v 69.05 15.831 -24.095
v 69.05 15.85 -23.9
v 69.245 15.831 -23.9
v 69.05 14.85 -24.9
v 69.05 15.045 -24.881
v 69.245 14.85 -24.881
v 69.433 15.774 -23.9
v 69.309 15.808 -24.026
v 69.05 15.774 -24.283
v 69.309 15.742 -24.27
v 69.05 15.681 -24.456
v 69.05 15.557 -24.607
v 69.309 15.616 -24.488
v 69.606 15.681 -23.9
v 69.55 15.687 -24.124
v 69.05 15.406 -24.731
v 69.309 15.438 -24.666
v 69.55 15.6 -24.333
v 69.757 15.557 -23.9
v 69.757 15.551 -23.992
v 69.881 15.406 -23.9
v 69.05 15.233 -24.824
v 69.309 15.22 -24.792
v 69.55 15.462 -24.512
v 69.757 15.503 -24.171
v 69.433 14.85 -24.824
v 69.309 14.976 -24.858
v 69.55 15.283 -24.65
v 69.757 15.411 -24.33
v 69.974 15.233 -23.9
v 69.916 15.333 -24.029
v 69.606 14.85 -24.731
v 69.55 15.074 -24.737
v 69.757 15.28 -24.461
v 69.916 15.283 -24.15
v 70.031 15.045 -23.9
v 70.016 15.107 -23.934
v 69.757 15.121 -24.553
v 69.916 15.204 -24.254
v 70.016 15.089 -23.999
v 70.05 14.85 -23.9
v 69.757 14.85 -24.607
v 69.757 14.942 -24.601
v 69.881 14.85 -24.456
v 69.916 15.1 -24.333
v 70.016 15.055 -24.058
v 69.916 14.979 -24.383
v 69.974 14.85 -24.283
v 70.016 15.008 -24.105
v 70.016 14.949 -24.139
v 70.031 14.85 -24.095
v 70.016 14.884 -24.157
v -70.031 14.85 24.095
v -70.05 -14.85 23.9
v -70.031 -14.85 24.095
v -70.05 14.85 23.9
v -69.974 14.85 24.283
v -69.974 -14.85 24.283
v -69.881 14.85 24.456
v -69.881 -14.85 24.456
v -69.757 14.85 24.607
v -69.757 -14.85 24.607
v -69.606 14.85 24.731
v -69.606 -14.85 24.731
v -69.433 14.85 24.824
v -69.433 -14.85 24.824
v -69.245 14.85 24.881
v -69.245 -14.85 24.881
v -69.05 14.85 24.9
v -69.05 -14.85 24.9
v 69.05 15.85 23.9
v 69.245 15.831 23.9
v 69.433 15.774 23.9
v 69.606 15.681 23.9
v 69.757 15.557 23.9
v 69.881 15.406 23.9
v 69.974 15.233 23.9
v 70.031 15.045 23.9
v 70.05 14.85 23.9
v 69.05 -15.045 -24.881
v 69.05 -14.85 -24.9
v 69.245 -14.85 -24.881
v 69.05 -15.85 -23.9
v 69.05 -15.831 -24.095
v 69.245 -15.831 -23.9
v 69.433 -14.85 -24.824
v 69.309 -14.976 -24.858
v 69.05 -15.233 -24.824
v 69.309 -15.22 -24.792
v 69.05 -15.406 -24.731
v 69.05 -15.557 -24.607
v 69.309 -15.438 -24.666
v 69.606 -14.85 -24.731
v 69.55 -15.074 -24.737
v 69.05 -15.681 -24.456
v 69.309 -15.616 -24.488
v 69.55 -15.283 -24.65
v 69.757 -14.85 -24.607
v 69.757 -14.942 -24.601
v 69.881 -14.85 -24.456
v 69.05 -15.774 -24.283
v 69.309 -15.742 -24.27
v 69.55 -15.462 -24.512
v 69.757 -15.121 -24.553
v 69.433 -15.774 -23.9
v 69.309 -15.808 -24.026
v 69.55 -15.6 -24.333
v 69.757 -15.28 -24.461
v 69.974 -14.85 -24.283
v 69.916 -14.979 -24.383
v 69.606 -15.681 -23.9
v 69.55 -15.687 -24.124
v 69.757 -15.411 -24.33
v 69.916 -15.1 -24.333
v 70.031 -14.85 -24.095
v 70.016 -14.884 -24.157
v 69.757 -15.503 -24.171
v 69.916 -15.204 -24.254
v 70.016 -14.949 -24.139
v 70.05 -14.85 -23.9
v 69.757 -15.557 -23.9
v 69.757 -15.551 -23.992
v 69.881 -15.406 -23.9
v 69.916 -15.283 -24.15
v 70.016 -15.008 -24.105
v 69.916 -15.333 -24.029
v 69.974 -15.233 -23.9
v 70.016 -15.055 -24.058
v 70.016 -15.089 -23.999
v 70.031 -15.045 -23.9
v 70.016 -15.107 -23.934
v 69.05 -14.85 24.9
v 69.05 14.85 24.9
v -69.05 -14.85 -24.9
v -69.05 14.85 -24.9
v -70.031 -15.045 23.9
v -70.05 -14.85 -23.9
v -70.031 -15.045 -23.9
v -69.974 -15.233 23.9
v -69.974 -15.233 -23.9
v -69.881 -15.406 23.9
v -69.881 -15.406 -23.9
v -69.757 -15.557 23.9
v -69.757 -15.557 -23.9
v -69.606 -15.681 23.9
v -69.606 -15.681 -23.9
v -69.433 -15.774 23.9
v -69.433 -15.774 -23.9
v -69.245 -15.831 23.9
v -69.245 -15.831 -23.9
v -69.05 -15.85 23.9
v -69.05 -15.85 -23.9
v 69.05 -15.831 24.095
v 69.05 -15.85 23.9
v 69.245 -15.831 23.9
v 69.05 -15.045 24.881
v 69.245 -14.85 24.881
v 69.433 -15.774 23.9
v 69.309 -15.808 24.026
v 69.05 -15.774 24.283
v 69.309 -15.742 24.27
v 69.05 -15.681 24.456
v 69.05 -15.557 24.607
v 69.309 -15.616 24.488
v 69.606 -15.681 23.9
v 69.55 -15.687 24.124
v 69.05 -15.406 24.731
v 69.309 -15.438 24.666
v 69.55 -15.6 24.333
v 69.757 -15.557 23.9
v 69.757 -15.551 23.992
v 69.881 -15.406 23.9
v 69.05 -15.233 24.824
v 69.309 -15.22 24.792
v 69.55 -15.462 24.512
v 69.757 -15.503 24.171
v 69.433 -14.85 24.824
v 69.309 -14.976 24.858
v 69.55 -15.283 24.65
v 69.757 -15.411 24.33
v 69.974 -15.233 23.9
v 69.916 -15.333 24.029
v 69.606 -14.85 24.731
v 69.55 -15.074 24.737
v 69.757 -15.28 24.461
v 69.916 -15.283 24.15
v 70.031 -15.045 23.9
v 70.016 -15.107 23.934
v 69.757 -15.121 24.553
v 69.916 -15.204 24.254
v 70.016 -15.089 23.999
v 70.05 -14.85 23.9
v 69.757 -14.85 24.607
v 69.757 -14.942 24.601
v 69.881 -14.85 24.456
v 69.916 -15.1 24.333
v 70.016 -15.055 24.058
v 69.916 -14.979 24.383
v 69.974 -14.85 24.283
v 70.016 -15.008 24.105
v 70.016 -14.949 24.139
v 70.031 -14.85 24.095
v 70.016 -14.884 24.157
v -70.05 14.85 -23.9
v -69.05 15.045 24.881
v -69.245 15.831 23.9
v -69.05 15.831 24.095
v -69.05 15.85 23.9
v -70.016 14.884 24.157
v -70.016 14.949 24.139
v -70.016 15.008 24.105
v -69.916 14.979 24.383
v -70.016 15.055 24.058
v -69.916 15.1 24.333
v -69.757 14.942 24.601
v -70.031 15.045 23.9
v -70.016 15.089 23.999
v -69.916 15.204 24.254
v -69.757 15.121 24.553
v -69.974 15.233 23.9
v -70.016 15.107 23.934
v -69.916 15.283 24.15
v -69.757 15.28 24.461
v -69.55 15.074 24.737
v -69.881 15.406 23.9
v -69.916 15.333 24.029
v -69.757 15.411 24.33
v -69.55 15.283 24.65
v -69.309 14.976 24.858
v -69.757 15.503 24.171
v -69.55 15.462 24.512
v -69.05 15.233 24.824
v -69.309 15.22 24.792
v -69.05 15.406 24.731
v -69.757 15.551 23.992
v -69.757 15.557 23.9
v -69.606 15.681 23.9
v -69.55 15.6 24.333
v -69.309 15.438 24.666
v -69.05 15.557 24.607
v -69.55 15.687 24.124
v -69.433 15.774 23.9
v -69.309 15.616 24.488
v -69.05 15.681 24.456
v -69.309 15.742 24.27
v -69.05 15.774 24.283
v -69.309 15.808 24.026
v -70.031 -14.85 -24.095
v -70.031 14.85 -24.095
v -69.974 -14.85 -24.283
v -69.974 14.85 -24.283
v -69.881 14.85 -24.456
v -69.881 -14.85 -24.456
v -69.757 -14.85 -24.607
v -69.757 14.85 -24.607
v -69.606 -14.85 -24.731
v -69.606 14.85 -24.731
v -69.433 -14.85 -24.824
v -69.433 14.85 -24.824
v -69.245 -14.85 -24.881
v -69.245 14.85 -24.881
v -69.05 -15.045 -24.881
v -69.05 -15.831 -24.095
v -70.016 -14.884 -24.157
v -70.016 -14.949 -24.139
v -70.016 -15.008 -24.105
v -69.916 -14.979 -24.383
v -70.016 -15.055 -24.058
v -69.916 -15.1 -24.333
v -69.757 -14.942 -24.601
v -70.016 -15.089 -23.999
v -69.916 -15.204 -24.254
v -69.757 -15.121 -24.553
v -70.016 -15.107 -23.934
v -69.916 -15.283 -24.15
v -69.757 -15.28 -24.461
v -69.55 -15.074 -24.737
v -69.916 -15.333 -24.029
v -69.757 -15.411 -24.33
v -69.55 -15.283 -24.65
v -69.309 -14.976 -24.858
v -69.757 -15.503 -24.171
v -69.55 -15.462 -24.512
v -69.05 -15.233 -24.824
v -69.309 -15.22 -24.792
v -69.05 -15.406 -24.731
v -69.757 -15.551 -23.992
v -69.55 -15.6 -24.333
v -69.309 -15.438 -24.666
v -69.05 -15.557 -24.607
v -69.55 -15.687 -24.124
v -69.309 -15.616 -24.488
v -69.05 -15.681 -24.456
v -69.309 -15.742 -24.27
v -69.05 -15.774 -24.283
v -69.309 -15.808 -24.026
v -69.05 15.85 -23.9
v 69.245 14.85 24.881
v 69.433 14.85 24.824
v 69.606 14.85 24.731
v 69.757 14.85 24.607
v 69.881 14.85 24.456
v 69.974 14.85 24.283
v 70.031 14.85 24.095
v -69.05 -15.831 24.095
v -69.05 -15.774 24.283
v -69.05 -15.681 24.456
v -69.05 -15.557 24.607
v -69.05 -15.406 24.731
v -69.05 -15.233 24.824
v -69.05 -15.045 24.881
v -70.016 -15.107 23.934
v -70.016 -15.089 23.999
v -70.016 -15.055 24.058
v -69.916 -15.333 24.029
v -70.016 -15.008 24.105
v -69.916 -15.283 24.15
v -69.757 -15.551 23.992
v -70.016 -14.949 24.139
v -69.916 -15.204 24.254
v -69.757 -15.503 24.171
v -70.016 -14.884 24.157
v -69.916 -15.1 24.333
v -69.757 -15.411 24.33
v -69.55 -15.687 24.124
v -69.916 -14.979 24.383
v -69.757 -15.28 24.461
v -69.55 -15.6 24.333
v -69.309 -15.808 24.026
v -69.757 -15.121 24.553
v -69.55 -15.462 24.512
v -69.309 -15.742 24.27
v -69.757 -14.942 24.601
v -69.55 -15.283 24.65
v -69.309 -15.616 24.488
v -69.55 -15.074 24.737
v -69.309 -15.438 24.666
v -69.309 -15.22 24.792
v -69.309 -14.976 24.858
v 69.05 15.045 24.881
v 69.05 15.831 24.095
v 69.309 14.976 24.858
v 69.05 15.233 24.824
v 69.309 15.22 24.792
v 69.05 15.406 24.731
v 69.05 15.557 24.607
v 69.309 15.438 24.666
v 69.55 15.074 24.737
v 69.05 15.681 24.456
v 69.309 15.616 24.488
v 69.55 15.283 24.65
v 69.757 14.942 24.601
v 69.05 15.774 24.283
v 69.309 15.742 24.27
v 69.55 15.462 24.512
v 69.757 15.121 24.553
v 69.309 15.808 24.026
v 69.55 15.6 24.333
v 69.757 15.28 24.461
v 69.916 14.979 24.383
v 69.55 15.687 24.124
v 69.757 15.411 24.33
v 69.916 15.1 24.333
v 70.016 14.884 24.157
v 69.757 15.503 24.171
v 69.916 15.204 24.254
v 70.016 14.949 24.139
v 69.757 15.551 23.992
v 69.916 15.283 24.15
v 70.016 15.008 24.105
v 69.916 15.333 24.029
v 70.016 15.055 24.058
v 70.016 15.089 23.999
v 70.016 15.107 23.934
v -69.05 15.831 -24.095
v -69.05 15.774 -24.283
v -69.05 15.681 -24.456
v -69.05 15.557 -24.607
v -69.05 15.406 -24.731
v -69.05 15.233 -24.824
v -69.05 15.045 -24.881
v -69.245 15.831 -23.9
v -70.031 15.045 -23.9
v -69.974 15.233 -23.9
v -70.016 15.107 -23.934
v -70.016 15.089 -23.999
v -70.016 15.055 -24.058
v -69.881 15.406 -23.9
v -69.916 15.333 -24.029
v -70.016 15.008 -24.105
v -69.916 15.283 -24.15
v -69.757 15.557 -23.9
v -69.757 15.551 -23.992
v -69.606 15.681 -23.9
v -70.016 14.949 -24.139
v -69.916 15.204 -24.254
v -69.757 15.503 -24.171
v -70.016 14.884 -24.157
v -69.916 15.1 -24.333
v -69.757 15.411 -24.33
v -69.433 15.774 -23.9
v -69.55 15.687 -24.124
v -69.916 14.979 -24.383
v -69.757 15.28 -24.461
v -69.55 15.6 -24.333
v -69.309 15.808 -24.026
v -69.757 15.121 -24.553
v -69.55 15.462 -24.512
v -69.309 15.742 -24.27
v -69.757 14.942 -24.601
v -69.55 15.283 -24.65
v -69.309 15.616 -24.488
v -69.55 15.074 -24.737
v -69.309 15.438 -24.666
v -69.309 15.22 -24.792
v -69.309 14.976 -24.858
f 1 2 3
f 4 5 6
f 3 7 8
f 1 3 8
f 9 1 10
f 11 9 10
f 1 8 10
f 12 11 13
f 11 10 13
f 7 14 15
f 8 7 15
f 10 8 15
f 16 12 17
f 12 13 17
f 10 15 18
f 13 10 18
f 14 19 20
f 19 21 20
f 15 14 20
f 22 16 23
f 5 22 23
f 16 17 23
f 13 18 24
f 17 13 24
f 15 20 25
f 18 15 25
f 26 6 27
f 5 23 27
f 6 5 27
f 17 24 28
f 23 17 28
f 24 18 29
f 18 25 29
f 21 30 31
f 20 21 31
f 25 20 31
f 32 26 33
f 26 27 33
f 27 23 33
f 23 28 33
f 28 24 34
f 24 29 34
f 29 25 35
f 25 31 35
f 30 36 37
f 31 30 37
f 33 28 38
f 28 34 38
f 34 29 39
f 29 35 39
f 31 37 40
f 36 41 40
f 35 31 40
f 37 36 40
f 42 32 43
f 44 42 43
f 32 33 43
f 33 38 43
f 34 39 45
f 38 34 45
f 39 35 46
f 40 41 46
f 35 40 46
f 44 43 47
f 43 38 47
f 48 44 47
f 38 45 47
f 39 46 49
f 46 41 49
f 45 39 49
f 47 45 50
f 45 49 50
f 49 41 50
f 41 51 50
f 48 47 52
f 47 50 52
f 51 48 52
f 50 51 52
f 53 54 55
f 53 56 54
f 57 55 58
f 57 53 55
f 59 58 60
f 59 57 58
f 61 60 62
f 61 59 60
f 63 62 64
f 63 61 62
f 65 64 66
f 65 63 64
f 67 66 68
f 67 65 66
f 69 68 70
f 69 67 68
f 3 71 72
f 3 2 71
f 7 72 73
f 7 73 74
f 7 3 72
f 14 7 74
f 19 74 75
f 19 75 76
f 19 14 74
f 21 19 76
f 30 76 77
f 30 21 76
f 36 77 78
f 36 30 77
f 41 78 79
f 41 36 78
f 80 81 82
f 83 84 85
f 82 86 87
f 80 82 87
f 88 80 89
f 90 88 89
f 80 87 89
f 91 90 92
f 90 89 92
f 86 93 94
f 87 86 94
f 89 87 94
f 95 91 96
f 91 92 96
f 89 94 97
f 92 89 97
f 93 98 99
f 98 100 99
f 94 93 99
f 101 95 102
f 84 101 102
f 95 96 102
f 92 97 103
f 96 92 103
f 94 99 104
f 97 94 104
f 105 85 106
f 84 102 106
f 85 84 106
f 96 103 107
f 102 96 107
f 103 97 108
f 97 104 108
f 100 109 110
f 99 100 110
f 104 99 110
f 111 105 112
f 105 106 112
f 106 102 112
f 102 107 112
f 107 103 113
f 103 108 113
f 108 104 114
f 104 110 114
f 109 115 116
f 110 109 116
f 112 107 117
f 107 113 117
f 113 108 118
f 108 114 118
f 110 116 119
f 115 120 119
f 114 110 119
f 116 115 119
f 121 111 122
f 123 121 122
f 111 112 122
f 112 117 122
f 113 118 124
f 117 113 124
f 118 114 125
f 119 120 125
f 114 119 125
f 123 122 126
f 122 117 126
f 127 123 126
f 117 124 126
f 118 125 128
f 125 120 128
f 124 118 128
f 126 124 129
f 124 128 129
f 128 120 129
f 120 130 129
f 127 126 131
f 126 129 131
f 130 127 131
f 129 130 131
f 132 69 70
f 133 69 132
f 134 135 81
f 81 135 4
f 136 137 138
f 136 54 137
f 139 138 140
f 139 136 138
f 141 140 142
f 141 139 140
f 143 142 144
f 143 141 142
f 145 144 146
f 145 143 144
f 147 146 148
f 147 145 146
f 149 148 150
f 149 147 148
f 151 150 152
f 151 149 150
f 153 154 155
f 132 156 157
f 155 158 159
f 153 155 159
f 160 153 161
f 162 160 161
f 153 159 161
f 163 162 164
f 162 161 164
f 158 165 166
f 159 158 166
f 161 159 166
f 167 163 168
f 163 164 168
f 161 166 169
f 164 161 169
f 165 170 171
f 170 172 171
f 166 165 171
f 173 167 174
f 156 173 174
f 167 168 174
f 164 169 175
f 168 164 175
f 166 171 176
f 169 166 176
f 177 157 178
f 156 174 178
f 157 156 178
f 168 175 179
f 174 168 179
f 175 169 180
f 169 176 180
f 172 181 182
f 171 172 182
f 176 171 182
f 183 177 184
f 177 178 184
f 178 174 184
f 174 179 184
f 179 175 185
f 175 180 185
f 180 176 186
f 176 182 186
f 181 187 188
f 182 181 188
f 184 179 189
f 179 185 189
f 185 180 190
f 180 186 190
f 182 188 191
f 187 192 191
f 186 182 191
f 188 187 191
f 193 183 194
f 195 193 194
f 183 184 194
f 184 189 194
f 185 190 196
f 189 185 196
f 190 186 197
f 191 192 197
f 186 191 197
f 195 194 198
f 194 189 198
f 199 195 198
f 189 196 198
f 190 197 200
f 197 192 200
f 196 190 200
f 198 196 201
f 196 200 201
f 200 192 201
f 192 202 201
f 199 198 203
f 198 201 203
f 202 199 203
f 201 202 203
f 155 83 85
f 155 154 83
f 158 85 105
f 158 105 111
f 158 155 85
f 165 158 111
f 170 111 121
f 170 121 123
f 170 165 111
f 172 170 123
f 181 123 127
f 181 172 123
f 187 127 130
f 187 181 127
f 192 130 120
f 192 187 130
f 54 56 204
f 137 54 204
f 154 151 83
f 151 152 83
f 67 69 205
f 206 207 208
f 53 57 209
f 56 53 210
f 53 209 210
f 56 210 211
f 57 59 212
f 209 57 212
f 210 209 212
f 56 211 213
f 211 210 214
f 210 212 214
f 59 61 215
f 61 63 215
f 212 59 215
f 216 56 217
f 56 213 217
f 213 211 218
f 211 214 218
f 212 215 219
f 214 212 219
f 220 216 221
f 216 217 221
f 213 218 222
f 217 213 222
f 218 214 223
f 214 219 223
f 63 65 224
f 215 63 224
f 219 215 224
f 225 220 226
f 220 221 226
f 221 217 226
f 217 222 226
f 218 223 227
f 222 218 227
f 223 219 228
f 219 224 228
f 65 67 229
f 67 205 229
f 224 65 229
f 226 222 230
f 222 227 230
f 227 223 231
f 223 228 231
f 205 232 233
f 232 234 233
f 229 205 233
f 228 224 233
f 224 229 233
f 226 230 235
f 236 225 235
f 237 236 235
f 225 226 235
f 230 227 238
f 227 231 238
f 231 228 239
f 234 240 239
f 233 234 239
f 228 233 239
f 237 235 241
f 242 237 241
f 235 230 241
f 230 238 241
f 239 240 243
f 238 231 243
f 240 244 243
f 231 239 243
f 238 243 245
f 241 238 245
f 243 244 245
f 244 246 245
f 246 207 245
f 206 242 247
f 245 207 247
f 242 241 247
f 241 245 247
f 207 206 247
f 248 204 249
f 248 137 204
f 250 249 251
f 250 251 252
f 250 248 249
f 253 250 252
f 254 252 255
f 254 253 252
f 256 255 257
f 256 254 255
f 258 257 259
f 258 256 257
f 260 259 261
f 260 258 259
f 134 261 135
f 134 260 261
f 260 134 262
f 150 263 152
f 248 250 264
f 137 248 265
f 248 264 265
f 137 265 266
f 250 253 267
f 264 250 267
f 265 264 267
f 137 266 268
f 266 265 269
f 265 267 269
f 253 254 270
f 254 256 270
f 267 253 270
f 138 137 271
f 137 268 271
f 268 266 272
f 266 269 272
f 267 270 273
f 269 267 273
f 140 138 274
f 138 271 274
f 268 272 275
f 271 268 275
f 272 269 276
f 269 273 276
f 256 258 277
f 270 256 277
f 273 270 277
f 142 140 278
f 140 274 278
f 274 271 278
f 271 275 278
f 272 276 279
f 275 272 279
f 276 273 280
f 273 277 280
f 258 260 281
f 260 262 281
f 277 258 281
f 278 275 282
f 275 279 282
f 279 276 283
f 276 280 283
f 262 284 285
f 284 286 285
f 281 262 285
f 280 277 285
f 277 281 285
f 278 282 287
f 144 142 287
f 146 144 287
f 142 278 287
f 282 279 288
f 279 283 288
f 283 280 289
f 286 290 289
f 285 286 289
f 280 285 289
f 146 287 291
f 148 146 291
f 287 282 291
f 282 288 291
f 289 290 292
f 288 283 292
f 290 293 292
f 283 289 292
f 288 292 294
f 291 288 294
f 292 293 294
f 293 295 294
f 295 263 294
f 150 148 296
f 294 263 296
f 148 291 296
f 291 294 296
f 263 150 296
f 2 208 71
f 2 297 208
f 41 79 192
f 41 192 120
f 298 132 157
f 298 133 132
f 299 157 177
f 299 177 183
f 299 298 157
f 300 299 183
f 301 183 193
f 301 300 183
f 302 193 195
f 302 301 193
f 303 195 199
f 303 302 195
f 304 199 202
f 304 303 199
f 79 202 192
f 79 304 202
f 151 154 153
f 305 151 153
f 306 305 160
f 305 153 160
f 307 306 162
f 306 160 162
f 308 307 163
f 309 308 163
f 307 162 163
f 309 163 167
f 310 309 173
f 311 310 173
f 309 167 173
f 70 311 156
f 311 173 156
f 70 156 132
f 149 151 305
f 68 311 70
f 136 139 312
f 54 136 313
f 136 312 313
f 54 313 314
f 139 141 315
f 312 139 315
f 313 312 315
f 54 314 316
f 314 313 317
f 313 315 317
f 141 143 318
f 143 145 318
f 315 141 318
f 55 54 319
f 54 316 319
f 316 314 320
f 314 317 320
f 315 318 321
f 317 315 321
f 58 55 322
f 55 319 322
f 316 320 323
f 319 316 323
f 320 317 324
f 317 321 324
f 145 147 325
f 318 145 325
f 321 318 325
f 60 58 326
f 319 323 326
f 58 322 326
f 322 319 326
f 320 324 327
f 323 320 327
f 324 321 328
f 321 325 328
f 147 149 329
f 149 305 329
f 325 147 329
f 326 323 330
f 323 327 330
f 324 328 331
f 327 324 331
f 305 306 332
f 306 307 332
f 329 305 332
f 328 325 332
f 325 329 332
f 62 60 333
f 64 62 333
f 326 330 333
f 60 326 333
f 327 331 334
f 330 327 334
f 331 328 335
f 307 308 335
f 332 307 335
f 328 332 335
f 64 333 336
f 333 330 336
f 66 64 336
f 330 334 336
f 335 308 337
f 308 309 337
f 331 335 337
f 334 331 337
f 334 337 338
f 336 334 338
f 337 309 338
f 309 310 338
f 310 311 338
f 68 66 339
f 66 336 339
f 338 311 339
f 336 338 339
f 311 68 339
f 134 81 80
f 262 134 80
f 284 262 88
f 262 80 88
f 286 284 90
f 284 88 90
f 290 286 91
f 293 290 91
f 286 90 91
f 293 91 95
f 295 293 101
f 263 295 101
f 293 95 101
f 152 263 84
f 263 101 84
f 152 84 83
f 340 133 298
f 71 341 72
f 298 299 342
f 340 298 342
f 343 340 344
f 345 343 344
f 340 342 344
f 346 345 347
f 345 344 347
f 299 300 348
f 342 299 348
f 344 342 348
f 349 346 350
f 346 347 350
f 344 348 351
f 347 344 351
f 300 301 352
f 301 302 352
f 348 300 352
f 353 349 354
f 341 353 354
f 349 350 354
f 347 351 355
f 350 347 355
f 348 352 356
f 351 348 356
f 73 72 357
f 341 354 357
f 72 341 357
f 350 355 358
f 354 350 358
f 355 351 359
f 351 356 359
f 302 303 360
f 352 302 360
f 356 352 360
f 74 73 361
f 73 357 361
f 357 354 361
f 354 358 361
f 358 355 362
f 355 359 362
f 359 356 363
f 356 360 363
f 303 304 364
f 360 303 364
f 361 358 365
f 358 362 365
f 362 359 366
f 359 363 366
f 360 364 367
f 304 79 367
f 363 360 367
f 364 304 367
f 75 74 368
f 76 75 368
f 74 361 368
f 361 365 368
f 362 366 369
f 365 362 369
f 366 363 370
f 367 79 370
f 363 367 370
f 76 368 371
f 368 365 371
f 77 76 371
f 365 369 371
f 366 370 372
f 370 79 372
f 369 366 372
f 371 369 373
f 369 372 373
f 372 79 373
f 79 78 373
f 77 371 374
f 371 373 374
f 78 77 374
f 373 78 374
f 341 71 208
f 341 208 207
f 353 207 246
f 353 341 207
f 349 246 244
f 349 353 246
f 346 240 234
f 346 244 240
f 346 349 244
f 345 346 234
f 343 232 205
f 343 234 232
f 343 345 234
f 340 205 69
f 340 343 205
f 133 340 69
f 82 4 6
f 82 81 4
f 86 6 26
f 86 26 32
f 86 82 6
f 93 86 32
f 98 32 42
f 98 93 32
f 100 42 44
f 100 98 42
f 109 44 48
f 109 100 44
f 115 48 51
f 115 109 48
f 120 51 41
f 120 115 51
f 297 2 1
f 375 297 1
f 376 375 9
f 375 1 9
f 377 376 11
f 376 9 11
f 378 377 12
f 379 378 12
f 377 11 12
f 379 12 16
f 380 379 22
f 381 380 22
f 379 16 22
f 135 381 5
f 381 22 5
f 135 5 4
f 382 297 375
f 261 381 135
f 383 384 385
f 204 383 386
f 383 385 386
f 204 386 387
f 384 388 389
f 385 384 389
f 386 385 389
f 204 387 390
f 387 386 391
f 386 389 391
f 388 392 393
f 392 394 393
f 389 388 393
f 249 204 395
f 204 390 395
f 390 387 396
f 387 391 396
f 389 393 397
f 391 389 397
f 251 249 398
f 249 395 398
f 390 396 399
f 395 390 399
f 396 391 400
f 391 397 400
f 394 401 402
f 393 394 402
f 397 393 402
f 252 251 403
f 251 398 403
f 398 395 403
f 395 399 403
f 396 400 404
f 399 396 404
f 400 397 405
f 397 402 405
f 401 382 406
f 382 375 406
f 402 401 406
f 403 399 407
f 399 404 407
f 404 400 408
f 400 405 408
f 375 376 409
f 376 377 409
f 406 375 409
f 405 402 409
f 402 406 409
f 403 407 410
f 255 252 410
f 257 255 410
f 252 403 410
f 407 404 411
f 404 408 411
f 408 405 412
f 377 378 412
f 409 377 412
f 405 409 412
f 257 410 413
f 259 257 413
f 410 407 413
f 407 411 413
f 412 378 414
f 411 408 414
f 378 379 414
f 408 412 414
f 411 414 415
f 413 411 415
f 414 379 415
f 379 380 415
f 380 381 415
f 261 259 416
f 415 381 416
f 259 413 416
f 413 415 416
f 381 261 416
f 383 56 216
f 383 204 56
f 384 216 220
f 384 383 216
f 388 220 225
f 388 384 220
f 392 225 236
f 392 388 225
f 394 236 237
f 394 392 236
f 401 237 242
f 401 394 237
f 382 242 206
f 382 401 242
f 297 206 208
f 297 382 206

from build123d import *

# Parameters (mm, degrees)
SKETCH1_W           = 140.1
SKETCH1_H           = 49.8
BOSS_EXTRUDE1_DEPTH = 15.85
FILLET1_R           = 1
FILLET2_R           = 1


with BuildPart() as part:
    # Sketch1 → Boss-Extrude1 (new, symmetric)
    with BuildSketch(Plane(origin=(0, 0, 0), x_dir=(1, 0, 0), z_dir=(0, 1, 0))):
        Rectangle(SKETCH1_W, SKETCH1_H)
    extrude(amount=BOSS_EXTRUDE1_DEPTH, both=True)

    # Fillet1
    fillet1_edges = [part.edges().sort_by_distance(p)[0] for p in [
        (0, 15.85, 24.9),
        (0, -15.85, 24.9),
        (0, -15.85, -24.9),
        (0, 15.85, -24.9),
    ]]
    fillet(fillet1_edges, radius=FILLET1_R)

    # Fillet2
    fillet2_edges = [part.edges().sort_by_distance(p)[0] for p in [
        (-70.05, 0, -24.9),
        (70.05, 0, -24.9),
        (-70.05, -15.85, 0),
        (-70.05, 0, 24.9),
        (-70.05, 15.85, 0),
        (-70.05, 15.557106781, 24.607106781),
        (-70.05, 15.557106781, -24.607106781),
        (-70.05, -15.557106781, 24.607106781),
        (-70.05, -15.557106781, -24.607106781),
        (70.05, -15.85, 0),
        (70.05, 15.85, 0),
        (70.05, 0, 24.9),
        (70.05, 15.557106781, 24.607106781),
        (70.05, 15.557106781, -24.607106781),
        (70.05, -15.557106781, 24.607106781),
        (70.05, -15.557106781, -24.607106781),
    ]]
    fillet(fillet2_edges, radius=FILLET2_R)


solid = part.part
